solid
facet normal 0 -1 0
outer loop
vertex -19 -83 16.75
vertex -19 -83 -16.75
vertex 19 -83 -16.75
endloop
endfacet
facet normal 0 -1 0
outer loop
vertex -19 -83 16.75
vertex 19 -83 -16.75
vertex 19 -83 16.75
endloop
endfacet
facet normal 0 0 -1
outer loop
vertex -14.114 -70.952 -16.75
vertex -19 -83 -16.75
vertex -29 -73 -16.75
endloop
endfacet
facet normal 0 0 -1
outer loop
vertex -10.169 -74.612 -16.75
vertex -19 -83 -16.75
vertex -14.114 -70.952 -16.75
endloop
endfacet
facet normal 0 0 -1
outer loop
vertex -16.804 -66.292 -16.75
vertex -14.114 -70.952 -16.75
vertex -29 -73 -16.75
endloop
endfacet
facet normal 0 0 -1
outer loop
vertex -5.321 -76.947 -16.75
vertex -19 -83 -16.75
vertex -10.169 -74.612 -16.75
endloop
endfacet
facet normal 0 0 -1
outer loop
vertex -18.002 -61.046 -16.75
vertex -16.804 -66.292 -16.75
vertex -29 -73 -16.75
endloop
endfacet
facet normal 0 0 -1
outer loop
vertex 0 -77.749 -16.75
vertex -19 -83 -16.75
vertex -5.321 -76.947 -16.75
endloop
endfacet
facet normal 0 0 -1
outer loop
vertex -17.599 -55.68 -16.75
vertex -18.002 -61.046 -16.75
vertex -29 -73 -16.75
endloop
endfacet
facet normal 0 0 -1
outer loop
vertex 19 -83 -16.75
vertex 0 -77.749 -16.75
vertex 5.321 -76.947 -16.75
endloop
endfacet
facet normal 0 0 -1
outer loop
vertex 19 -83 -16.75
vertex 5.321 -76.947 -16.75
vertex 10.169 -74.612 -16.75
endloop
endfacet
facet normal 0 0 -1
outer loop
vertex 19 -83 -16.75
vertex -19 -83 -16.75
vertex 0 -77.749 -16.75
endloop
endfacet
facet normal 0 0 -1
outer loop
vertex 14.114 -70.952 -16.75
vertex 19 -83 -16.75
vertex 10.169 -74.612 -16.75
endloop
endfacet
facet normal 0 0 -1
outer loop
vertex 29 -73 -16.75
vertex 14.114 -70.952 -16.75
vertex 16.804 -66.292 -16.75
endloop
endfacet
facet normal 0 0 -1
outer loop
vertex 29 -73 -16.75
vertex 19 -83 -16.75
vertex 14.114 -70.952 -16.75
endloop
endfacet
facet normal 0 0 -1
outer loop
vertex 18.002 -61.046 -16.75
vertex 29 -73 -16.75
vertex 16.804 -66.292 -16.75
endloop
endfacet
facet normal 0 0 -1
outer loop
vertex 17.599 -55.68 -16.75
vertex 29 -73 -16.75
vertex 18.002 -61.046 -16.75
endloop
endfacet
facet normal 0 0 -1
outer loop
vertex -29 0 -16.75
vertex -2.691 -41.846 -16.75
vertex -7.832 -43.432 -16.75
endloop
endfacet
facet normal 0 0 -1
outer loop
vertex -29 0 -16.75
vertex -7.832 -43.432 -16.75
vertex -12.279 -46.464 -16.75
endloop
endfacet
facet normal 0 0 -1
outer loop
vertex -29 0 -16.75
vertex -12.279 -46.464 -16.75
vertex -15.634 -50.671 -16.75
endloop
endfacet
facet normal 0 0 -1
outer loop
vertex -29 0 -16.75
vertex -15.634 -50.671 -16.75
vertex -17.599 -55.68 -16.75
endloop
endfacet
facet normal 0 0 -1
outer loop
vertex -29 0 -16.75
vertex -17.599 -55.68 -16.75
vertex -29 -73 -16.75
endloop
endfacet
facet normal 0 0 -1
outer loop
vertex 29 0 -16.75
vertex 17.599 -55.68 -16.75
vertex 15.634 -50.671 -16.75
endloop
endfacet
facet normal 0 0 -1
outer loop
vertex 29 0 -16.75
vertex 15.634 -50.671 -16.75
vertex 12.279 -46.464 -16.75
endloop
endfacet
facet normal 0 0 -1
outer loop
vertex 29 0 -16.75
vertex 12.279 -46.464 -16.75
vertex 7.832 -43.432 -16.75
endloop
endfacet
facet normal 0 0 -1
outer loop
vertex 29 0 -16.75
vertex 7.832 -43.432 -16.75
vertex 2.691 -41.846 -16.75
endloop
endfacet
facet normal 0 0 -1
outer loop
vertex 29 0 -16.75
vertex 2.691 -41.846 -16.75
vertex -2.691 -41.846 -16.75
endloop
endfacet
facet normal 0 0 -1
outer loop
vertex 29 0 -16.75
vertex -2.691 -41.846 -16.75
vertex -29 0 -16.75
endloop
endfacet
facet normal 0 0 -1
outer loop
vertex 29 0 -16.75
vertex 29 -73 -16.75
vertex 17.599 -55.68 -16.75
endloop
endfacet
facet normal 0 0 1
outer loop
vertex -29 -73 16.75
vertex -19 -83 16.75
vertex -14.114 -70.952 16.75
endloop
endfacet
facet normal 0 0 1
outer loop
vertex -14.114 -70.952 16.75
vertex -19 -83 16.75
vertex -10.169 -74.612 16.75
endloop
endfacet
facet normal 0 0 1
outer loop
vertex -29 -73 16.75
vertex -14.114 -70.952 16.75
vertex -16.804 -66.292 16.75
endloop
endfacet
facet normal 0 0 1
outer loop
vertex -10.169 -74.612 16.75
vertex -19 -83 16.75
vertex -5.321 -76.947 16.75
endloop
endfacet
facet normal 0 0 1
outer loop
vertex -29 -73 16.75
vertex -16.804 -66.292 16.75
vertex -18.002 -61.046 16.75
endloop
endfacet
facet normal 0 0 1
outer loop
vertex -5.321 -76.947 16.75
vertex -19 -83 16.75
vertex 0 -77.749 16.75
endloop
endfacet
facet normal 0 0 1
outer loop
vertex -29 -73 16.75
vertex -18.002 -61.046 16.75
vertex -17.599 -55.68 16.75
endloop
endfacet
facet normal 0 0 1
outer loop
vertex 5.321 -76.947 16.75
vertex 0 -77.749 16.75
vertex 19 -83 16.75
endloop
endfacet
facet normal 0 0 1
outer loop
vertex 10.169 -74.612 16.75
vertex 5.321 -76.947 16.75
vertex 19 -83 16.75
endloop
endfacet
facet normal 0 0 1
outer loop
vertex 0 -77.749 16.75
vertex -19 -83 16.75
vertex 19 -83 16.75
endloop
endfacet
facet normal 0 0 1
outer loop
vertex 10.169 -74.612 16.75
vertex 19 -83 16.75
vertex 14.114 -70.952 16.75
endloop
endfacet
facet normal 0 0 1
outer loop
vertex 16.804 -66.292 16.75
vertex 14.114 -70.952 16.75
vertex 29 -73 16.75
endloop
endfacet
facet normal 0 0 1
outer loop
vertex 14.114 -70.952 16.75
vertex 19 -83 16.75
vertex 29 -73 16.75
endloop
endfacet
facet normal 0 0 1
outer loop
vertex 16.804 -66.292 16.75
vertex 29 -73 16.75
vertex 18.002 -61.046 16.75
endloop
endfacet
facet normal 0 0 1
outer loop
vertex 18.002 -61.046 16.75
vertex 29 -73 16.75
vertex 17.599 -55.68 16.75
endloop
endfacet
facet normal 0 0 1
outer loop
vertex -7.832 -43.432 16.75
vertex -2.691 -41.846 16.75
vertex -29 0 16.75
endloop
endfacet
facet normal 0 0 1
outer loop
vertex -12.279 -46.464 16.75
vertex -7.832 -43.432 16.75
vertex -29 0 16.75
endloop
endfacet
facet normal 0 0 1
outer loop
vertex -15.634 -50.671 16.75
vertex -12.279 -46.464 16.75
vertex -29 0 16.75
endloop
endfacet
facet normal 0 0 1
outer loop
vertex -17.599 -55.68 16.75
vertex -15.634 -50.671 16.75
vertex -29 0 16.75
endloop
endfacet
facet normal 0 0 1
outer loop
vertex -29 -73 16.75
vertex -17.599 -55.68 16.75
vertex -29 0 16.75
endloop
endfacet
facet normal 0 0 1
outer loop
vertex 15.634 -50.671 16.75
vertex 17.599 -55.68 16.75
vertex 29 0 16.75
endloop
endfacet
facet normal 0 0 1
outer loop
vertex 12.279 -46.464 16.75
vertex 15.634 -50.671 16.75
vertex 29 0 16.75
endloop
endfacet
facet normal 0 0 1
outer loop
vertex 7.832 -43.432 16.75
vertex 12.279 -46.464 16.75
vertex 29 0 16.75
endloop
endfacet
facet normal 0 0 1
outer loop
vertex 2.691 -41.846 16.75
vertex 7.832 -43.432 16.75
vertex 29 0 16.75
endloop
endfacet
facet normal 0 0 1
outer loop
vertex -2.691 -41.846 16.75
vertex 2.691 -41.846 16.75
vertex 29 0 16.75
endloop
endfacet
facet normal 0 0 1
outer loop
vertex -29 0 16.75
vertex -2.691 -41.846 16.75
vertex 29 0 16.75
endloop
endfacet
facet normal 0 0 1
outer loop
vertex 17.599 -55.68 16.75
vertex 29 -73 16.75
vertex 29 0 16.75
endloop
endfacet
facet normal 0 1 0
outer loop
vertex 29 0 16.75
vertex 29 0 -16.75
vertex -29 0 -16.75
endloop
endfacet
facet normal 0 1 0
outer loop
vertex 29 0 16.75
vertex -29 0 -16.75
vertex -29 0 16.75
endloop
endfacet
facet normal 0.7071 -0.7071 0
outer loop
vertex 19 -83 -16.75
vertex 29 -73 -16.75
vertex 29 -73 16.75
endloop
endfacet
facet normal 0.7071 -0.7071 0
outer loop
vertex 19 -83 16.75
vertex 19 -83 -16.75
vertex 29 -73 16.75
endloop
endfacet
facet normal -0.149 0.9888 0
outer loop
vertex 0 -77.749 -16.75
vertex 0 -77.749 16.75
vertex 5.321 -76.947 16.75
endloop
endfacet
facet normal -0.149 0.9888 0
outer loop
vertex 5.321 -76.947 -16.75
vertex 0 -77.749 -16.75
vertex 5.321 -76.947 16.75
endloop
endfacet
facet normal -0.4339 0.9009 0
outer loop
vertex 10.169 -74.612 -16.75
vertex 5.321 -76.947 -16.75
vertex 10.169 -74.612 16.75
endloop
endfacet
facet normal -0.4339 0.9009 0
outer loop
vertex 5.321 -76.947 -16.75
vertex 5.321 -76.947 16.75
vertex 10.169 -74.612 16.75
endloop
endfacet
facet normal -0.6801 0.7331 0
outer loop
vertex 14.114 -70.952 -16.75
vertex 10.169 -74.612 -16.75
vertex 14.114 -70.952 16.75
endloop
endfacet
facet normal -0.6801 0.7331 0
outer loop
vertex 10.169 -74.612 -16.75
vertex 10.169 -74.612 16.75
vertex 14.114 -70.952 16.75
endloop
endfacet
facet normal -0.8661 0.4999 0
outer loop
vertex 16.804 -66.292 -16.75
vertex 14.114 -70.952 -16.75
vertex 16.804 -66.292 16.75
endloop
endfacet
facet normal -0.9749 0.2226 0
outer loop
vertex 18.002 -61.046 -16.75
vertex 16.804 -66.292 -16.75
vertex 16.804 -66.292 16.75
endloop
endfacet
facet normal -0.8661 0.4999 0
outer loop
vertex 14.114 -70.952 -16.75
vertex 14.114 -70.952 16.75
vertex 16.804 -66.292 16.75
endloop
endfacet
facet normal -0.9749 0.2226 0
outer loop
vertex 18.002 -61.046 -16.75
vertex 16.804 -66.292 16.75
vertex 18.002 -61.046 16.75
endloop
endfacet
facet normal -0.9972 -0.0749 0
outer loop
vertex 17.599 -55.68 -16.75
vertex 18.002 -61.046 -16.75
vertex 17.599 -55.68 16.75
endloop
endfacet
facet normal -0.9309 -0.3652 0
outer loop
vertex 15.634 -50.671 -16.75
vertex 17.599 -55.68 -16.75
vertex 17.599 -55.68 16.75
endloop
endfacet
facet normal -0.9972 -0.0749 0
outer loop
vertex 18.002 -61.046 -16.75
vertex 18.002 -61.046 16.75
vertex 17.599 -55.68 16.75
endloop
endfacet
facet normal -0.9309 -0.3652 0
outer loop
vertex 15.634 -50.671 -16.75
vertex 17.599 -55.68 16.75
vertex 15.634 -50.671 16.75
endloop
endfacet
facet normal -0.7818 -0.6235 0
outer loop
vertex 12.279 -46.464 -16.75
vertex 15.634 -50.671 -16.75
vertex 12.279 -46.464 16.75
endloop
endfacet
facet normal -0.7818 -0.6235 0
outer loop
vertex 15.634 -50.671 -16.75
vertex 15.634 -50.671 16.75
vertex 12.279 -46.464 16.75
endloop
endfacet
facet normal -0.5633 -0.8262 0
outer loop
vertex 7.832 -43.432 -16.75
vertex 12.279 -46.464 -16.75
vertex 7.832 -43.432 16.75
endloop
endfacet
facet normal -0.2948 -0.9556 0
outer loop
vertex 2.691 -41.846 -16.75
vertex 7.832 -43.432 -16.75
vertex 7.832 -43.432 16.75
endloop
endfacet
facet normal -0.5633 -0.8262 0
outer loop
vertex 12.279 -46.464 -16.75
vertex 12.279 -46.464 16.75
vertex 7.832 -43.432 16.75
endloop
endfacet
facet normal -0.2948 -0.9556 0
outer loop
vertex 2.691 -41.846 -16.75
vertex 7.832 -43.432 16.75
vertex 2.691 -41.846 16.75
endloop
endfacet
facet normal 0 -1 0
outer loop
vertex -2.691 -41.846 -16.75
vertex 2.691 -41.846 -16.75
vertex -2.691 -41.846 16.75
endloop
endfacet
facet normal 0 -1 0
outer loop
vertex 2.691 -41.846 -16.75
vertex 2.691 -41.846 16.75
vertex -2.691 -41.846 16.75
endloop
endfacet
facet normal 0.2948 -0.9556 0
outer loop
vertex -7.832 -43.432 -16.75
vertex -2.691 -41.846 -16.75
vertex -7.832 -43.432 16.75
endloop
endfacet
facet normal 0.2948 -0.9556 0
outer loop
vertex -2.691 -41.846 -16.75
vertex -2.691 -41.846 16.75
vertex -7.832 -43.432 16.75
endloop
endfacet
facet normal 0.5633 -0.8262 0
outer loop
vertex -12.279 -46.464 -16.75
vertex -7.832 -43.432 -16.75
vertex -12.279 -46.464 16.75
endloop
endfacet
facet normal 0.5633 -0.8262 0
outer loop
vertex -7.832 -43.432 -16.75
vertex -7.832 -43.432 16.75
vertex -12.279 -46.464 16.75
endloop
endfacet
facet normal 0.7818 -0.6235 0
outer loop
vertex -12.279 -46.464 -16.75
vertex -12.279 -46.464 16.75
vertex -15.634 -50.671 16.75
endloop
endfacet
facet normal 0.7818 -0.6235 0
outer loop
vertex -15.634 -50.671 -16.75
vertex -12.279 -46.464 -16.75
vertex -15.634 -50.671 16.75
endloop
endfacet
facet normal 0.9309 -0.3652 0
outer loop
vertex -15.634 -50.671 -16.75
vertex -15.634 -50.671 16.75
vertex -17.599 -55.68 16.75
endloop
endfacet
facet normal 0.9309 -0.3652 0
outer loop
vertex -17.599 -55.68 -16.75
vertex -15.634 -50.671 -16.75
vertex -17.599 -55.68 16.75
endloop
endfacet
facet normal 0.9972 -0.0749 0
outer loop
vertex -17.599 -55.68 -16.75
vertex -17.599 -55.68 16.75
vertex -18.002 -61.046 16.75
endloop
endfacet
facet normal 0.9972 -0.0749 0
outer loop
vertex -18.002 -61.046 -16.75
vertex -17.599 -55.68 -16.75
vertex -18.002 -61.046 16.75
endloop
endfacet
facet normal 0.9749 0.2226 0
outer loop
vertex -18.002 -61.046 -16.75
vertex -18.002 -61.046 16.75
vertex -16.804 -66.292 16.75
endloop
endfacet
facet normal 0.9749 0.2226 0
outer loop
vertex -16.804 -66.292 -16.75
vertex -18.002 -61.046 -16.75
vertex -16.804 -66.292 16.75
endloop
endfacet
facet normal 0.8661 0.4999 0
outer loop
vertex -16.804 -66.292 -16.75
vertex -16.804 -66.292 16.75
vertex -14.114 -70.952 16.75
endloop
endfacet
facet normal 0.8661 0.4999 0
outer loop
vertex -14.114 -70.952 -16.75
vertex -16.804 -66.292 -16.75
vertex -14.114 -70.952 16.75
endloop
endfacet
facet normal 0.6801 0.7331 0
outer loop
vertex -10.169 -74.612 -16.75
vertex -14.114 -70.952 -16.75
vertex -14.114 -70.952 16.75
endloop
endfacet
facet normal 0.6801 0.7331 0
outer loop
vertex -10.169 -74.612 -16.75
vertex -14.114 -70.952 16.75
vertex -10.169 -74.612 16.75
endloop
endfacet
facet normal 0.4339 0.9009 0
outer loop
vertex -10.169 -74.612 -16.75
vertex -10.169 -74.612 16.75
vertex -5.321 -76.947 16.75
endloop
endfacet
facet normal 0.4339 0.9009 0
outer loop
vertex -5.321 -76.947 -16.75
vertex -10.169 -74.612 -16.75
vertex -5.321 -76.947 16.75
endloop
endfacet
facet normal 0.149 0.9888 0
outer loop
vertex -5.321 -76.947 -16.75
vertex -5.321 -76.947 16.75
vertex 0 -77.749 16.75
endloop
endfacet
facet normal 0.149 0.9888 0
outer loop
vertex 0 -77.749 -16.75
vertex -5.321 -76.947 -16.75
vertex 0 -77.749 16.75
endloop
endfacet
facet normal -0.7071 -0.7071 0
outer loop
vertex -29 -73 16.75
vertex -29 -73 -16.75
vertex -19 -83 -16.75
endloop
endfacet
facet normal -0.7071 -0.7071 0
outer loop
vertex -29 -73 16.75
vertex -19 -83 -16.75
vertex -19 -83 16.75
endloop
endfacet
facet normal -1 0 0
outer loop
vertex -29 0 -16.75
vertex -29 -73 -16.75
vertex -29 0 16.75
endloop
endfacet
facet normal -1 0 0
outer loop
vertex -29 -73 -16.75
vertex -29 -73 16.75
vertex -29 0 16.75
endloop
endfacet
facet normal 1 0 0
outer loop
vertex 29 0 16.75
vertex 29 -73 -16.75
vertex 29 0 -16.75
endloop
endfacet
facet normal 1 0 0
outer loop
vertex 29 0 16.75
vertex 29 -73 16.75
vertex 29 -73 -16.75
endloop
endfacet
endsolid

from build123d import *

# Parameters (mm, degrees)
SKETCH014_W     = 83
SKETCH014_H     = 33.5
PAD008_DEPTH    = 29
CHAMFER001_SIZE = 10
SKETCH018_R     = 18.052065
POCKET006_DEPTH = 33.501


with BuildPart() as part:
    # Sketch014 → Pad008 (new body, symmetric)
    with BuildSketch(Plane.YZ):
        with Locations((-41.5, 0)):
            Rectangle(SKETCH014_W, SKETCH014_H)
    extrude(amount=PAD008_DEPTH, both=True)

    # Chamfer001
    chamfer001_edges = [part.edges().sort_by_distance(p)[0] for p in [
        (-29, -83, 0),
        (29, -83, 0),
    ]]
    chamfer(chamfer001_edges, length=CHAMFER001_SIZE)

    # Sketch018 (on Face8 of Chamfer001) → Pocket006 (cut, through all)
    with BuildSketch(Plane(origin=(0, 0, 16.75), x_dir=(0, -1, 0), z_dir=(0, 0, 1))):
        with Locations((59.696613, 0)):
            Circle(SKETCH018_R)
    extrude(amount=-POCKET006_DEPTH, mode=Mode.SUBTRACT)


solid = part.part
